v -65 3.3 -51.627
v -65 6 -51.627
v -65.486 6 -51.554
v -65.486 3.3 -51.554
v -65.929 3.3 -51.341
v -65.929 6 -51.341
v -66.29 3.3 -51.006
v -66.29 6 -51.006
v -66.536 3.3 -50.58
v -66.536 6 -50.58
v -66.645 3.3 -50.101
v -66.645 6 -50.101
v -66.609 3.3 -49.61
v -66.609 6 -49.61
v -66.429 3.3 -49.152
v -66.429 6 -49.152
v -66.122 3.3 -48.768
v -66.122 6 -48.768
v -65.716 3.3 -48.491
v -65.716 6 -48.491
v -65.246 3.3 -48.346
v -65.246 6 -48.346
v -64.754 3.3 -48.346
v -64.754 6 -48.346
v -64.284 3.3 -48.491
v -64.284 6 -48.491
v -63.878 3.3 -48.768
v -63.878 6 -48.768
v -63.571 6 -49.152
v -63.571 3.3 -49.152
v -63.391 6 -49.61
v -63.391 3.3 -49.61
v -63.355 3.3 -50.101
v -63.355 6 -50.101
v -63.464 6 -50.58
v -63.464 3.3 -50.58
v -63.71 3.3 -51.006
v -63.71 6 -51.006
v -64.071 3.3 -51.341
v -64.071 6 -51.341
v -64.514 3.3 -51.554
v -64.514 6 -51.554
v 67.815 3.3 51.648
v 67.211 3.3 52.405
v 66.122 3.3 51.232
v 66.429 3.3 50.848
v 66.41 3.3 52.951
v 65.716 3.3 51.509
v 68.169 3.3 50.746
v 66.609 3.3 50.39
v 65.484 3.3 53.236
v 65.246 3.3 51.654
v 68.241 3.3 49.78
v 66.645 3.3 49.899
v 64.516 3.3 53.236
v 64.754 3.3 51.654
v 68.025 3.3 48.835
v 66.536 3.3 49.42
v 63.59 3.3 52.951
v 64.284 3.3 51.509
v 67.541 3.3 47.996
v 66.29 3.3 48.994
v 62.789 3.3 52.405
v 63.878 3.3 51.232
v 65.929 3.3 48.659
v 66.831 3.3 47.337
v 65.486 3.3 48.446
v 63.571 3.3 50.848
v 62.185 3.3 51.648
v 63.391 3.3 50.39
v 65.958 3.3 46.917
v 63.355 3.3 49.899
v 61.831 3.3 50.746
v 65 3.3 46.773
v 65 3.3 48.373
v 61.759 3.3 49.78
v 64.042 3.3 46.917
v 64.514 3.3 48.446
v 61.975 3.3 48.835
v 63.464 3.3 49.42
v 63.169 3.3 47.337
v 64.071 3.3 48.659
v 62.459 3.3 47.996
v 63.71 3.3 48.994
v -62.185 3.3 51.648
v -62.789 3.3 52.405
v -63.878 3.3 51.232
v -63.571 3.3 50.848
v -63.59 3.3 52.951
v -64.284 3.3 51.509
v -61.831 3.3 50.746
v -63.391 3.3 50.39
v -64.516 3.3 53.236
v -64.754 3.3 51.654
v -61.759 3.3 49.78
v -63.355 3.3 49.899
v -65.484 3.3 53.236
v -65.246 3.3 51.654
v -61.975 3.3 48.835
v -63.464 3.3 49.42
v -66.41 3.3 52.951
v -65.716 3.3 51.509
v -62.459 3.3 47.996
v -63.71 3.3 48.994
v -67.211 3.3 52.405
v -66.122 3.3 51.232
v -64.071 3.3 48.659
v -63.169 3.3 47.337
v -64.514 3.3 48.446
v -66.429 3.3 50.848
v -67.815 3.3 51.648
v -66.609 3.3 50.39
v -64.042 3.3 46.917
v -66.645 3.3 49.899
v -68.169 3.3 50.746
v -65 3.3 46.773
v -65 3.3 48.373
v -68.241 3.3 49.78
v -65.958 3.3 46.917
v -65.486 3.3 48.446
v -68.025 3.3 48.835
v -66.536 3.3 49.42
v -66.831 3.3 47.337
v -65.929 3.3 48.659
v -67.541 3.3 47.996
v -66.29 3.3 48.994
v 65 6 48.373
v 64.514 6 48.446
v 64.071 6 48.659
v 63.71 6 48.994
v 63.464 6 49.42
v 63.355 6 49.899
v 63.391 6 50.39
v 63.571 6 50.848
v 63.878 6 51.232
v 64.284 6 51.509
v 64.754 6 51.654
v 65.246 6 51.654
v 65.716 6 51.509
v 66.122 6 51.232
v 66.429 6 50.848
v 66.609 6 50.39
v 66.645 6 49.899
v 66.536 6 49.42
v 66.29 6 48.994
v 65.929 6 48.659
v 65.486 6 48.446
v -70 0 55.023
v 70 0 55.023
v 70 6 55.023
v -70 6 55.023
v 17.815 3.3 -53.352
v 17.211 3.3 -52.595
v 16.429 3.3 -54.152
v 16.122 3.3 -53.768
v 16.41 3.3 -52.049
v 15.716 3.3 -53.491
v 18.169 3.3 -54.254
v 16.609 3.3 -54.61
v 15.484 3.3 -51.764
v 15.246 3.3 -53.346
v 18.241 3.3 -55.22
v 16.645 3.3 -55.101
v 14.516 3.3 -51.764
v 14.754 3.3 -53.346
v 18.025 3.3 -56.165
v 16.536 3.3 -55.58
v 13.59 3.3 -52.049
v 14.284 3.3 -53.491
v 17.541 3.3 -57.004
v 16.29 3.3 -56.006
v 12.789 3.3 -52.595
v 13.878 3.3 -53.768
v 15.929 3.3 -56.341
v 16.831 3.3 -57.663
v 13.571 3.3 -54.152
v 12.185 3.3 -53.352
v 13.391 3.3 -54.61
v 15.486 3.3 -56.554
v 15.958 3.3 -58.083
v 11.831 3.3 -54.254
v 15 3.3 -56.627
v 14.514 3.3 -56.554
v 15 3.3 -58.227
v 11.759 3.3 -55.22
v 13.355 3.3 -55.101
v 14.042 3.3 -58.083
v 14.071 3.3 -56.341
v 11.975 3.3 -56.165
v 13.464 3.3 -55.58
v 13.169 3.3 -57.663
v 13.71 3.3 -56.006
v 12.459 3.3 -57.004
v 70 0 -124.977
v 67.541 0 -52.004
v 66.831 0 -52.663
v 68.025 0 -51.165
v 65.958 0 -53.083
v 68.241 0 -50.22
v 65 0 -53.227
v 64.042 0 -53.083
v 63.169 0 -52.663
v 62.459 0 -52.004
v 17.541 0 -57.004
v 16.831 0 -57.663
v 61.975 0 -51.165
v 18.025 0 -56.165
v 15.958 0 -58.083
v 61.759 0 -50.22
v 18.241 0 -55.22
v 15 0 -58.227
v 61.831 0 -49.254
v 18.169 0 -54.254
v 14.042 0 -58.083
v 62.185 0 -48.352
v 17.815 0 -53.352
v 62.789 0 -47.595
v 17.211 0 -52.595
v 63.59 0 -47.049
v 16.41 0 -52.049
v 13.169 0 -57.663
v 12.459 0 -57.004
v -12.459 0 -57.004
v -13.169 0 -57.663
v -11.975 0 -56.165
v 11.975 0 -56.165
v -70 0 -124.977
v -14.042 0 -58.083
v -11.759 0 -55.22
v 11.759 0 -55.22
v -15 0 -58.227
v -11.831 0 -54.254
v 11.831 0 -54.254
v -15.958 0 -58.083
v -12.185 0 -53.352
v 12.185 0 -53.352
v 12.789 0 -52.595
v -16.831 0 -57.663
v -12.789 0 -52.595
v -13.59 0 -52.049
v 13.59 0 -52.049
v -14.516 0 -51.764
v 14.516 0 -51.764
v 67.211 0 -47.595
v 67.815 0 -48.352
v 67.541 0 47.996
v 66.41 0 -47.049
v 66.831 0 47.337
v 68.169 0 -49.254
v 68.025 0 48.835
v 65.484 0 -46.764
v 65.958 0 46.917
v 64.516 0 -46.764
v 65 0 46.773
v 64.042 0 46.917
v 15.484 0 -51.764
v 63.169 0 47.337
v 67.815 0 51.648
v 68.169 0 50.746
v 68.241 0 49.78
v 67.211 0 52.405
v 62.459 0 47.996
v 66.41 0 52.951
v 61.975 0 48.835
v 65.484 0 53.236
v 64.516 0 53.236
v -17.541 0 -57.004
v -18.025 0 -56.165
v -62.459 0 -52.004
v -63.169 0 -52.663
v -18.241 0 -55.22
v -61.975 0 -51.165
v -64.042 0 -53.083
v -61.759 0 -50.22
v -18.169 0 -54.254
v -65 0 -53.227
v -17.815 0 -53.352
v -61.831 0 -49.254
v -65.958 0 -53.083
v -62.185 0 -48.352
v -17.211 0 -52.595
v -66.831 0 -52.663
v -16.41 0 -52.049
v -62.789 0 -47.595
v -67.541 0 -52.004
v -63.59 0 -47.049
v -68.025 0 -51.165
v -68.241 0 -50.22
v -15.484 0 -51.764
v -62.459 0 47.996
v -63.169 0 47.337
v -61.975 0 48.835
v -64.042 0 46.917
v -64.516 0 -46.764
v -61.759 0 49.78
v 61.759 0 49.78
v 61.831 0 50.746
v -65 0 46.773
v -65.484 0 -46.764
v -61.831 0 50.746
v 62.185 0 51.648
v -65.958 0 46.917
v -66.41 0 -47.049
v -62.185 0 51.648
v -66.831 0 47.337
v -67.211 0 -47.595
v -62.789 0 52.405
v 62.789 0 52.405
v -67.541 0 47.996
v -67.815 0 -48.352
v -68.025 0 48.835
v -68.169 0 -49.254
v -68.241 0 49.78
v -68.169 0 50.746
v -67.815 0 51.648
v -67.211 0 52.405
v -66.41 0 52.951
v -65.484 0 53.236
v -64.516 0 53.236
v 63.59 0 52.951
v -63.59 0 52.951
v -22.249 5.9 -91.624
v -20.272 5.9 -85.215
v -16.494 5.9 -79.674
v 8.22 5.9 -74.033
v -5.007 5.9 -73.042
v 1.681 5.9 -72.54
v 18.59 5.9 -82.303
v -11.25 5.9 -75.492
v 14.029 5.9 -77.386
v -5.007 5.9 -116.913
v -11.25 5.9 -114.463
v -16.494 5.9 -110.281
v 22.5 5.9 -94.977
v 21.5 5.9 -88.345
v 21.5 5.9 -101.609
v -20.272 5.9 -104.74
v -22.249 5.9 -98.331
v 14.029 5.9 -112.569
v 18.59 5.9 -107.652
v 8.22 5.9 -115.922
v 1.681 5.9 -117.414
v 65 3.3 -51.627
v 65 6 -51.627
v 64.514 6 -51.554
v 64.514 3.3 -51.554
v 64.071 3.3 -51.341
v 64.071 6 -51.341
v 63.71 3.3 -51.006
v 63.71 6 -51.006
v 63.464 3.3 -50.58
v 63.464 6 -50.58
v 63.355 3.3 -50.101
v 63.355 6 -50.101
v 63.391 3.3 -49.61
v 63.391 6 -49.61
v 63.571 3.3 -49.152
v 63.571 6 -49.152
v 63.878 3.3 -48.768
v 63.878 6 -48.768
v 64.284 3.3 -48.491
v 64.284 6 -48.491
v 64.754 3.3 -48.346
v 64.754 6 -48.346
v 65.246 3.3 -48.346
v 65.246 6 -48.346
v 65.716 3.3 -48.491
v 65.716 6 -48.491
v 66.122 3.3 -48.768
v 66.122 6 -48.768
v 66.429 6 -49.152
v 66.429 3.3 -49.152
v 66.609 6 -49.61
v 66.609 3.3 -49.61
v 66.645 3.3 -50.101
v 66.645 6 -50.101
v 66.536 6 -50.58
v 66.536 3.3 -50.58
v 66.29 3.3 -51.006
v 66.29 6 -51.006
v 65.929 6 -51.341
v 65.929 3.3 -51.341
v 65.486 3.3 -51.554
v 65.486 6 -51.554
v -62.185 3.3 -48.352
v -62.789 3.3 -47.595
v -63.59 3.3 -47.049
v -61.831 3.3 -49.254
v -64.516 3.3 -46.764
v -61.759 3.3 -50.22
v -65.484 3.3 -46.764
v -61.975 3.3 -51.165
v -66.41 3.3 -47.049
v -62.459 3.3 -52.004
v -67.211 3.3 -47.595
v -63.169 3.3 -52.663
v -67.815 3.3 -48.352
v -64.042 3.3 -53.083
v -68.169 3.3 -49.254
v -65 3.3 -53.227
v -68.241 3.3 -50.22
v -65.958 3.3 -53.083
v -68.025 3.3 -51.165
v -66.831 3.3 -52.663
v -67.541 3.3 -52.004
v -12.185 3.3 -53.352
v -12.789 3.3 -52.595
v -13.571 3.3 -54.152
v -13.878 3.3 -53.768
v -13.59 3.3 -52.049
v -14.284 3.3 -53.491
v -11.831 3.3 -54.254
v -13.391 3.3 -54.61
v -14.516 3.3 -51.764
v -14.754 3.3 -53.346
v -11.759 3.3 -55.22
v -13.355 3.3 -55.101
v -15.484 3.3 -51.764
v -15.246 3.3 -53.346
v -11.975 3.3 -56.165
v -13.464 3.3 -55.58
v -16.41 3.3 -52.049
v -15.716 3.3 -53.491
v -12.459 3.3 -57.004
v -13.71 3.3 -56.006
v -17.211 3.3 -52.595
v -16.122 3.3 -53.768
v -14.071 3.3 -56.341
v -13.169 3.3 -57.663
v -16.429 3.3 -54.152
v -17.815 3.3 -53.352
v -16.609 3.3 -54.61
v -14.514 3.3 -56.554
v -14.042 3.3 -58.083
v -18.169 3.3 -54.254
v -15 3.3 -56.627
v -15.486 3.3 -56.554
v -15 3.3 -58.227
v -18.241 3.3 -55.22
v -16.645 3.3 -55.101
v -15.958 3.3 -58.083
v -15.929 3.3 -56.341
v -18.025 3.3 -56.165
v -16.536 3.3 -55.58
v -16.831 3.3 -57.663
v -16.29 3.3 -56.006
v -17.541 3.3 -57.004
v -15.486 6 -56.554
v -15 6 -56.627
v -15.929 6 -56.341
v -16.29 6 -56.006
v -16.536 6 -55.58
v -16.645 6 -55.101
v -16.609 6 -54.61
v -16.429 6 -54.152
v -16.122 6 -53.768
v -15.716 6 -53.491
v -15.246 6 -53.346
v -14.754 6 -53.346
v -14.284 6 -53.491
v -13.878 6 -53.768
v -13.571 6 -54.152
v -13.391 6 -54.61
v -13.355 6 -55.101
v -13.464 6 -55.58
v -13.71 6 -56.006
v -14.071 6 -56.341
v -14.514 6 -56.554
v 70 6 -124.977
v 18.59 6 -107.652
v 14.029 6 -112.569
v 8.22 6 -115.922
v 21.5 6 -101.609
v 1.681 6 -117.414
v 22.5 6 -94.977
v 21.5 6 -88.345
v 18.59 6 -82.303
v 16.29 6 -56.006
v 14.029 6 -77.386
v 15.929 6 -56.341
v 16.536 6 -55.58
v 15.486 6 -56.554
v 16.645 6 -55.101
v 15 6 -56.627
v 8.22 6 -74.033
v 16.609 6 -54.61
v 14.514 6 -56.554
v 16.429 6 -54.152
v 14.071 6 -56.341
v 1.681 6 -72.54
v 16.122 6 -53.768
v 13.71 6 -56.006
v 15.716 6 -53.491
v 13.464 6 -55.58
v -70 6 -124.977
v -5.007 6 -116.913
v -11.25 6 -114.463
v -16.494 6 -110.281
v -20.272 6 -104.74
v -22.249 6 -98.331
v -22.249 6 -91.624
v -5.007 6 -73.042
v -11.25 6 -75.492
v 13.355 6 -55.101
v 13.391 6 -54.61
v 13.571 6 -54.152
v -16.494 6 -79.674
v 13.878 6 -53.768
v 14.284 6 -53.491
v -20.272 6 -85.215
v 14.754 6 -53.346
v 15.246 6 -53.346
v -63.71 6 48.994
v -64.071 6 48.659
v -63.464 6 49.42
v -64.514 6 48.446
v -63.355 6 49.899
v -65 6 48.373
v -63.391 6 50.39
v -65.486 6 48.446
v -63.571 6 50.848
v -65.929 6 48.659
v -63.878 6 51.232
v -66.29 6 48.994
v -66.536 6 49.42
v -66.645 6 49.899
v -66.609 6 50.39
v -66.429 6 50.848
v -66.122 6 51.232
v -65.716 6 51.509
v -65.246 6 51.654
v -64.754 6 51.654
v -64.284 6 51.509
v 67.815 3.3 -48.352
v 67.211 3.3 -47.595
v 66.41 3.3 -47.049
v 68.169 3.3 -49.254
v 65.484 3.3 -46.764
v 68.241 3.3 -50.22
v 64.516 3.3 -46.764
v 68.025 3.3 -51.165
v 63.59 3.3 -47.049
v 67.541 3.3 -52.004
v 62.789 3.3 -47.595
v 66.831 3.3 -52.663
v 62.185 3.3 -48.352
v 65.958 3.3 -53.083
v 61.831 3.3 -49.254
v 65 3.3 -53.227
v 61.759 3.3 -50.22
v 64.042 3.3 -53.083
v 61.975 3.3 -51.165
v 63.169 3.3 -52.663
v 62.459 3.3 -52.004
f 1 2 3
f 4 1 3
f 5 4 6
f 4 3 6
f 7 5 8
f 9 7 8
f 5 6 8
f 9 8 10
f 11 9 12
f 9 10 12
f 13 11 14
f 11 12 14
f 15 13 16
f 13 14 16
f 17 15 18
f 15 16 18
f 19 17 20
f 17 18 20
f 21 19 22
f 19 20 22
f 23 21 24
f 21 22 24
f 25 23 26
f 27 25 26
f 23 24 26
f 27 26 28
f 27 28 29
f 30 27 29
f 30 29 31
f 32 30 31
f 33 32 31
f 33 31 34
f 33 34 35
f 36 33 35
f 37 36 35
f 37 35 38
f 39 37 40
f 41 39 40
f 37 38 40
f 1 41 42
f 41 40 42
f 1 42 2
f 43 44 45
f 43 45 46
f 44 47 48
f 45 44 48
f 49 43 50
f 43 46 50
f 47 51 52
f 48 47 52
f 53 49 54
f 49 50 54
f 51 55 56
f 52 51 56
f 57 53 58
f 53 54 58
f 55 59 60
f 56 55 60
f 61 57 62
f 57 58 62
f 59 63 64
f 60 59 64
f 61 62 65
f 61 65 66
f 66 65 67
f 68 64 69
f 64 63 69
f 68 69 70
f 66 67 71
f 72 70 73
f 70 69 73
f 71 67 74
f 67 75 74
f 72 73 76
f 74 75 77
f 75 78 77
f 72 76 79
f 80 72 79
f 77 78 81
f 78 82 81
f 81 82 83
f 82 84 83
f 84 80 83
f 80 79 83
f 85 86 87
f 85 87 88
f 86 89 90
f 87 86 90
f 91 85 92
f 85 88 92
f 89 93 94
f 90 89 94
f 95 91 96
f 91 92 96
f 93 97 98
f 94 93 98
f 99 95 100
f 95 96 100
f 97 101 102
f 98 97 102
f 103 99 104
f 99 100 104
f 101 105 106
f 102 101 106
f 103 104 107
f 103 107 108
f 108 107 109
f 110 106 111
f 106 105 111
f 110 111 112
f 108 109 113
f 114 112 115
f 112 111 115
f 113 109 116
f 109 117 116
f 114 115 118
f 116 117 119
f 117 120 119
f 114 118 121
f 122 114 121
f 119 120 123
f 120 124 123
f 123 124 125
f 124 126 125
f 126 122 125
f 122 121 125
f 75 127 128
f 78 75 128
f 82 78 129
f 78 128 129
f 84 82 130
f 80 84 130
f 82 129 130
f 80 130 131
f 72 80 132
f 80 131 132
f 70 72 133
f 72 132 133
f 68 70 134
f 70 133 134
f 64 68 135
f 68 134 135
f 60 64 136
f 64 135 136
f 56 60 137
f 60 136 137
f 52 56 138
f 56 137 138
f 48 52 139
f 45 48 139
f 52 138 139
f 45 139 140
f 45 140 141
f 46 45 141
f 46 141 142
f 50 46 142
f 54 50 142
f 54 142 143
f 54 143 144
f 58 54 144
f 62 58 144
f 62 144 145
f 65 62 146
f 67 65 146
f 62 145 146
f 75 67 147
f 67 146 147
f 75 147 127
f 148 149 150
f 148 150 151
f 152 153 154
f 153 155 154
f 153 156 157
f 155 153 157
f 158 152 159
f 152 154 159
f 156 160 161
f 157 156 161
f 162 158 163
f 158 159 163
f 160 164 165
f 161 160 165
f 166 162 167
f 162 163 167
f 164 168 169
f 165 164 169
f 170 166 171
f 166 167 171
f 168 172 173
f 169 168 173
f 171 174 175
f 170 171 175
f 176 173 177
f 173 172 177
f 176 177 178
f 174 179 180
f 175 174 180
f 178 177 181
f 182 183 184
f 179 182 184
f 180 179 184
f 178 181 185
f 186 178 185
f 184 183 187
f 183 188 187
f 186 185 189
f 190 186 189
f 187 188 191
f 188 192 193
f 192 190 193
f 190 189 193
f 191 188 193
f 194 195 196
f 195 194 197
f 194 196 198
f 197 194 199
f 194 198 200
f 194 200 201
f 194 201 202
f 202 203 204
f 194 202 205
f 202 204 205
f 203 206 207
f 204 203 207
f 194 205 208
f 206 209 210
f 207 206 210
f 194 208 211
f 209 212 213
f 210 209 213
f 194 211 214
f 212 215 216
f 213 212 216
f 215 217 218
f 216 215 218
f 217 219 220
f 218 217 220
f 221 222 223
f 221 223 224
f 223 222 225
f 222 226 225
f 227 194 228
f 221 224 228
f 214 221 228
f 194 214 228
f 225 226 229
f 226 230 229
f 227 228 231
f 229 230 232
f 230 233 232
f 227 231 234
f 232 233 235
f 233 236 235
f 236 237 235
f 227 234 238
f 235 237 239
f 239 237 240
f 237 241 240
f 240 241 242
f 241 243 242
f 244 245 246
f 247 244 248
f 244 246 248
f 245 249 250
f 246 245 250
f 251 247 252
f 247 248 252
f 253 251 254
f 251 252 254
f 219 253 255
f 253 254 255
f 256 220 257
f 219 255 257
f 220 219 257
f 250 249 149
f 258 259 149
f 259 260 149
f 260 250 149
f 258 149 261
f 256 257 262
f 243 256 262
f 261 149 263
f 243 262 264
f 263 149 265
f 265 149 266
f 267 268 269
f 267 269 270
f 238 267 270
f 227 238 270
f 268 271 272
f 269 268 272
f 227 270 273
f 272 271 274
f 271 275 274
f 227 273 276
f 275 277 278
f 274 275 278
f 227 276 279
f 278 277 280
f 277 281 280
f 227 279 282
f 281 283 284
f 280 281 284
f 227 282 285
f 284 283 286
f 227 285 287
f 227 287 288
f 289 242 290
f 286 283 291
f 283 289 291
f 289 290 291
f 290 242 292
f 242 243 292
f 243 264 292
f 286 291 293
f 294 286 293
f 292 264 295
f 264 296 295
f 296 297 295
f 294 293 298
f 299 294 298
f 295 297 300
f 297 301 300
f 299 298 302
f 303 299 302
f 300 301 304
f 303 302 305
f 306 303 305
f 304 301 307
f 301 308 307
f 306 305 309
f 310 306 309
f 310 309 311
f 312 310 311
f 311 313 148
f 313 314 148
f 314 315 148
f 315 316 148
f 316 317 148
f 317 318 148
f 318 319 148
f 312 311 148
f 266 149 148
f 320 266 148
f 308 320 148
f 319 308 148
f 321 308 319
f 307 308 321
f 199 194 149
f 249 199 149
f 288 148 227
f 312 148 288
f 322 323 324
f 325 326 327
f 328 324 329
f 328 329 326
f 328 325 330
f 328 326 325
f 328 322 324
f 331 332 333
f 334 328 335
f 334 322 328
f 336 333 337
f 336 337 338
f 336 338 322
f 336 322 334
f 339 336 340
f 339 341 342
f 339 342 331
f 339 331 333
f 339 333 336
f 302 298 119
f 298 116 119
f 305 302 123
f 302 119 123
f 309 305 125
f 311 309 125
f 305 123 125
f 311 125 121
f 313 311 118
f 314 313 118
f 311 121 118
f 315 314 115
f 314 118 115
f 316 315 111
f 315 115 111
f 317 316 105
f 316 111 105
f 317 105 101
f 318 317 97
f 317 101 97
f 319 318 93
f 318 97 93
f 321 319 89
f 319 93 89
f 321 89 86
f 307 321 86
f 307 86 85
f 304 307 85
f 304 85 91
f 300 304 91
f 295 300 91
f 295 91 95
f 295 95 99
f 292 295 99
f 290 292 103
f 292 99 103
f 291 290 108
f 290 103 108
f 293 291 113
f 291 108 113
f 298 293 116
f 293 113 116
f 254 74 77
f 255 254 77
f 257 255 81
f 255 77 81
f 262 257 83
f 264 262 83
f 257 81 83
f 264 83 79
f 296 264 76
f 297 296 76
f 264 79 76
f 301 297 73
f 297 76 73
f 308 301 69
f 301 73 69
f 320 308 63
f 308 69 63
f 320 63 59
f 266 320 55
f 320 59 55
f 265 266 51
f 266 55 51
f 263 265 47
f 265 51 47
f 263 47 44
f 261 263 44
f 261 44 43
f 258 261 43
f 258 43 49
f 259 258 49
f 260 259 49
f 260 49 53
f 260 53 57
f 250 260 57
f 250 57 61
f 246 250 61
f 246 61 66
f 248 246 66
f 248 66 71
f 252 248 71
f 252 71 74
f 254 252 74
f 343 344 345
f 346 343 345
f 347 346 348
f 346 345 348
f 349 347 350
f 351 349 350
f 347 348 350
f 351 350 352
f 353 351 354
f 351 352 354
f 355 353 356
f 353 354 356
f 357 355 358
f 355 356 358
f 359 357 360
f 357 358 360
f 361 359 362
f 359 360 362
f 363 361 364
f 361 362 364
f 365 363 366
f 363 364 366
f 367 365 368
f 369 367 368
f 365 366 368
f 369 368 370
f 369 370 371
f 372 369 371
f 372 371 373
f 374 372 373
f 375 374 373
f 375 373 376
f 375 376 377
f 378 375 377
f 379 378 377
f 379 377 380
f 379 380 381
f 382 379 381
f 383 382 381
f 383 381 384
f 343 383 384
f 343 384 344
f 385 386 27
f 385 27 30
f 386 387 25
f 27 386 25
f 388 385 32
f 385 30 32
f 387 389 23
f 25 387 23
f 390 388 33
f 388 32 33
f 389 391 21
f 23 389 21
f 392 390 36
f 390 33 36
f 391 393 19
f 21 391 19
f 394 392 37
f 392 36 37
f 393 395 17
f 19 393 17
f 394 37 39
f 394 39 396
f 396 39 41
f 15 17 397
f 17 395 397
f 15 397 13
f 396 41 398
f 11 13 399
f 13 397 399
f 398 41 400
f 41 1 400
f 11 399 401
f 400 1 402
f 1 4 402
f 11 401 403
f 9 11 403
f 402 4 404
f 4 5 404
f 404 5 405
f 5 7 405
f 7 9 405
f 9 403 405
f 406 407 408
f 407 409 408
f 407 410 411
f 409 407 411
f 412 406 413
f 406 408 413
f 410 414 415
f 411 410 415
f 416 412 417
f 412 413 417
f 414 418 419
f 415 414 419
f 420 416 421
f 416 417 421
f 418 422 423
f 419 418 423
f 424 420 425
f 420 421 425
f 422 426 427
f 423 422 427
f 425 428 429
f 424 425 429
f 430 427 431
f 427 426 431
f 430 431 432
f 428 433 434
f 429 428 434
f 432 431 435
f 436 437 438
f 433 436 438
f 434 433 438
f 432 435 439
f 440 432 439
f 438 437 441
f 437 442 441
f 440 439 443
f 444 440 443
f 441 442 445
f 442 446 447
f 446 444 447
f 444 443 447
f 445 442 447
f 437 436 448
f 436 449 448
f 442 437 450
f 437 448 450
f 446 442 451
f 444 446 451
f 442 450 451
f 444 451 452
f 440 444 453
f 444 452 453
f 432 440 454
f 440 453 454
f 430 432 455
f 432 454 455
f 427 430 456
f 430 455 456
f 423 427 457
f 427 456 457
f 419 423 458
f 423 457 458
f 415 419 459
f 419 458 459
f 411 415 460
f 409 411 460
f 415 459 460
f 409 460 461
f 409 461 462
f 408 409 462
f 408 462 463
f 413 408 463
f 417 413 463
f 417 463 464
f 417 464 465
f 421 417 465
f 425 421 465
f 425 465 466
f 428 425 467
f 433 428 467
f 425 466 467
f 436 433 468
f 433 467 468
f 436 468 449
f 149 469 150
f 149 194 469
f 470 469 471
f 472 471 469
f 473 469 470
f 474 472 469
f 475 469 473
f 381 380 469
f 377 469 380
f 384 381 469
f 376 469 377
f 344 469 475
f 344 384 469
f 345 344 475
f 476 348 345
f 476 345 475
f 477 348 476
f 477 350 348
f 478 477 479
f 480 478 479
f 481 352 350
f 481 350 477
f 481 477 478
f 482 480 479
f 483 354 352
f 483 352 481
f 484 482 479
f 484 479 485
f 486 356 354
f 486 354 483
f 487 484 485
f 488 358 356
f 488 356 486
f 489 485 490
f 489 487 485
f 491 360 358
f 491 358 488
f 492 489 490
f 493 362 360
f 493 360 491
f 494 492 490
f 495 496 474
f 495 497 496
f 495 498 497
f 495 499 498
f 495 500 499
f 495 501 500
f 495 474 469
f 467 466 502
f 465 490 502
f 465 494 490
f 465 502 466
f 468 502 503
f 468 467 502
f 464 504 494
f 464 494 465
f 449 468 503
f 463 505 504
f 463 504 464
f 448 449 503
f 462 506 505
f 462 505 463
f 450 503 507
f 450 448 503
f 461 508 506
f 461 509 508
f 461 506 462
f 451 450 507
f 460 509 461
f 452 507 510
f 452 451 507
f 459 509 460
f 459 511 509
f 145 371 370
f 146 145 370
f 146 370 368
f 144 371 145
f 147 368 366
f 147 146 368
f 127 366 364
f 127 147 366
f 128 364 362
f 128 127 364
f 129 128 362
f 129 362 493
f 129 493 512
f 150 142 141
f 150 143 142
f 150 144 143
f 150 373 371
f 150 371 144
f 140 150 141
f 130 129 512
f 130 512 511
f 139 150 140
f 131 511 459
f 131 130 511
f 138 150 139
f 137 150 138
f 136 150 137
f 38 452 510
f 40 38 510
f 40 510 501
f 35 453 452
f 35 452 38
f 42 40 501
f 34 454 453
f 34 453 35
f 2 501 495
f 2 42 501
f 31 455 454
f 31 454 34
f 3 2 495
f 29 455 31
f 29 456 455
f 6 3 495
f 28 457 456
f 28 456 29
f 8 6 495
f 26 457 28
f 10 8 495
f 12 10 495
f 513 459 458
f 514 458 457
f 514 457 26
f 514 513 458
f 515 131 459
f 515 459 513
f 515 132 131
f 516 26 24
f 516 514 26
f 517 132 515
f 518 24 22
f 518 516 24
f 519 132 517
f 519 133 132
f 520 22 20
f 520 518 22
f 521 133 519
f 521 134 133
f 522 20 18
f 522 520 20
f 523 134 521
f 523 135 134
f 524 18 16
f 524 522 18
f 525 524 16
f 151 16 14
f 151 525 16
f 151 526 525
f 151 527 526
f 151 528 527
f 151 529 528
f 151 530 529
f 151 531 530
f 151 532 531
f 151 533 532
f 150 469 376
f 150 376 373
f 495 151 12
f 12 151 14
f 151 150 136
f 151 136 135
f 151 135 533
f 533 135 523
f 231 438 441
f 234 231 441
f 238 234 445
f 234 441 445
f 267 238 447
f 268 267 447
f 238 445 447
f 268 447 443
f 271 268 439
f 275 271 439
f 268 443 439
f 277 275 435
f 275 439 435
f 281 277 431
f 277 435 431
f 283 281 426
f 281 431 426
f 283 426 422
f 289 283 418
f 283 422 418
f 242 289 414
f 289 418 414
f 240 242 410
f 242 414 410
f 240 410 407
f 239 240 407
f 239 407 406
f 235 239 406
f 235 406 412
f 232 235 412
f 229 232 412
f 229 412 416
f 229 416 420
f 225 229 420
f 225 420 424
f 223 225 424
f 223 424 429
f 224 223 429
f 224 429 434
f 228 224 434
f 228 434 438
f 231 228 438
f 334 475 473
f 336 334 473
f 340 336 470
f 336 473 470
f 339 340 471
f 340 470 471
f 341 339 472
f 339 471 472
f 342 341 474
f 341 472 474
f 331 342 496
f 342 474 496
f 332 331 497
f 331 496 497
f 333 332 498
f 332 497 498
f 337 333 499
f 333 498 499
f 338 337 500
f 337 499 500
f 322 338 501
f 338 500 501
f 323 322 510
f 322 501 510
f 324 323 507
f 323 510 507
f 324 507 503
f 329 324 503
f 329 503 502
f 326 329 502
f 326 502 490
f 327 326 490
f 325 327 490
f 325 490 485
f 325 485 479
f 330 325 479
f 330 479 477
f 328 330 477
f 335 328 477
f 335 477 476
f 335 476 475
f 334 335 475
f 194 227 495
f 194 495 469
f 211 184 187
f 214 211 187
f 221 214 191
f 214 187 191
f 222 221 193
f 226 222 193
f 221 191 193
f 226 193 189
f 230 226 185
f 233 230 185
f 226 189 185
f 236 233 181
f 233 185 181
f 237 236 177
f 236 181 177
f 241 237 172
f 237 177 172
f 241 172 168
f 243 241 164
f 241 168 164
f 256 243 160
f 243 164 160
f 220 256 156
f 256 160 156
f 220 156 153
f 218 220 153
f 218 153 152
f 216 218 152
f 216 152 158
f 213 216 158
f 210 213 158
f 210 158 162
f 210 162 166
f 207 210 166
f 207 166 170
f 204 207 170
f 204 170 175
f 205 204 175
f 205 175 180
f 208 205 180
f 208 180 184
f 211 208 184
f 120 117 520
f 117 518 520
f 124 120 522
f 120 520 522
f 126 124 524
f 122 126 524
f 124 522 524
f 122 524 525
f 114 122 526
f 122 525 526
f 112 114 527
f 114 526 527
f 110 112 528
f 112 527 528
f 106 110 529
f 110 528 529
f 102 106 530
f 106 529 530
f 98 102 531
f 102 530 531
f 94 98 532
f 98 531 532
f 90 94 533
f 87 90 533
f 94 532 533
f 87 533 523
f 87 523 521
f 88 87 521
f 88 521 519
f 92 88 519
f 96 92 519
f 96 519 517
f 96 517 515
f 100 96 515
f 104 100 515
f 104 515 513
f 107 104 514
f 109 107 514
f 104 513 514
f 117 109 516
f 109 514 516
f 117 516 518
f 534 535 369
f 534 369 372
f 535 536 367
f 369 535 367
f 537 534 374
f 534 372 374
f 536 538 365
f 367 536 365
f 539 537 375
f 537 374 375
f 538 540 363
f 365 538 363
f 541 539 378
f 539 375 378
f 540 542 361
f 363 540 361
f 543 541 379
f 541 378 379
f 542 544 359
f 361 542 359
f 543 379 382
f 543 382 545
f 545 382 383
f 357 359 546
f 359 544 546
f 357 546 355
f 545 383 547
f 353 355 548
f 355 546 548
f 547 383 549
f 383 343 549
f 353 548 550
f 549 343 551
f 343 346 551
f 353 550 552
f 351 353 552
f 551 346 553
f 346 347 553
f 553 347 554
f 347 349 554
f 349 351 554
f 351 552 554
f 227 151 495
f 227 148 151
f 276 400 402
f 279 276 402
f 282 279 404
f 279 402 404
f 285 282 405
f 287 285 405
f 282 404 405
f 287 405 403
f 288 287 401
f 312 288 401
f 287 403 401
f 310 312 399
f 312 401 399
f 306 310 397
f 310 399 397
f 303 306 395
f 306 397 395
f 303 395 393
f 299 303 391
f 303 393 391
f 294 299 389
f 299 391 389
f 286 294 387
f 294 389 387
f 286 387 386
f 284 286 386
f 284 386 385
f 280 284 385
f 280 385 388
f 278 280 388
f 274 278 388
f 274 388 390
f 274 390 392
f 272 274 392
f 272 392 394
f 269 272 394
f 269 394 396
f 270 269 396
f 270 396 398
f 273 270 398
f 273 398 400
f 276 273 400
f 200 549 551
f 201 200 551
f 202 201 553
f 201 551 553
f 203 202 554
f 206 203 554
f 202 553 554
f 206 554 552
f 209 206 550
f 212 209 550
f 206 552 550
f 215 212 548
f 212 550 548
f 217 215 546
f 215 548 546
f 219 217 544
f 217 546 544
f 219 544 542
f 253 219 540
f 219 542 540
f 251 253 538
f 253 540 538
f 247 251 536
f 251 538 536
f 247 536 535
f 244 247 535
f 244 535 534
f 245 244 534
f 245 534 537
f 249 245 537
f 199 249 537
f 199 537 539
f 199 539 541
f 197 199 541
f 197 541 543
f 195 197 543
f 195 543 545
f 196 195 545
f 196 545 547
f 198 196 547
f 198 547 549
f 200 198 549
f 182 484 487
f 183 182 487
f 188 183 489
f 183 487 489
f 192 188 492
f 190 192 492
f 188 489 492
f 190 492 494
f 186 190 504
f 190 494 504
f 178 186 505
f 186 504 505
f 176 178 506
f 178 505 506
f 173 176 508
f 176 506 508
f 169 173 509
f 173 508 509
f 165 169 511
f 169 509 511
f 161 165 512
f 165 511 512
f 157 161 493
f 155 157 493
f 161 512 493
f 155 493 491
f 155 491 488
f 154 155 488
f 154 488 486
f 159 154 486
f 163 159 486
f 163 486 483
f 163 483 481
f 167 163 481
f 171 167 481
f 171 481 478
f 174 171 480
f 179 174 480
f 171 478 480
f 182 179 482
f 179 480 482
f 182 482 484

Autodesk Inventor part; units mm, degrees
ref_plane "YZ Plane" through (0, 0, 0) normal (1, 0, 0) x (0, 1, 0)
ref_plane "XZ Plane" through (0, 0, 0) normal (0, 1, 0) x (-1, 0, 0)
ref_plane "XY Plane" through (0, 0, 0) normal (0, 0, 1) x (1, 0, 0)
sketch "草圖1" plane through (0, 0, 0) normal (0, 1, 0) x (-1, 0, 0)
  line L0 (70, -124.9774) -> (-70, -124.9774)
  line L1 (-70, -124.9774) -> (-70, 55.0226)
  line L2 (-70, 55.0226) -> (70, 55.0226)
  line L3 (70, 55.0226) -> (70, -124.9774)
  point P0 (0, 0)
  point P1 (0, 55.0226)
  dimension "d0" = 140
  dimension "d1" = 180
extrude "擠出1" add sketch "草圖1" along normal blind 6
sketch "草圖2" plane through (0, 0, 0) normal (0, -1, 0) x (1, 0, 0)
  line L0 (-65, 50.0226) -> (65, 50.0226)
  line L1 (65, 50.0226) -> (65, -49.9774)
  line L2 (65, -49.9774) -> (-65, -49.9774)
  line L3 (-65, -49.9774) -> (-65, 50.0226)
  line L4 (70, 55.0226) -> (-70, 55.0226) projected
  line L5 (15, -54.9774) -> (-15, -54.9774)
  point P0 (0, 0)
  point P1 (0, 50.0226)
  point P2 (0, -54.9774)
  dimension "d18" = 130
  dimension "d19" = 100
  dimension "d20" = 5
  dimension "d21" = 30
  dimension "d22" = 110
hole "孔1" at (65, 0, 50.0226) at (65, 0, -49.9774) at (-65, 0, -49.9774) at (-65, 0, 50.0226) at (15, 0, -54.9774) at (-15, 0, -54.9774) direction (0, 1, 0) diameter 3.3 end through all counterbore diameter 6.5 counterbore depth 3.3
sketch "草圖3" plane through (0, 6, 0) normal (0, 1, 0) x (1, 0, 0)
  circle A0 centre (0, 94.9774) radius 22.5
  line L0 (-70, -55.0226) -> (70, -55.0226) projected
  point P0 (0, 0)
  dimension "d15" = 45
  dimension "d23" = 150
extrude "擠出2" cut sketch "草圖3" against normal blind 0.1
properties part number "A0005"
